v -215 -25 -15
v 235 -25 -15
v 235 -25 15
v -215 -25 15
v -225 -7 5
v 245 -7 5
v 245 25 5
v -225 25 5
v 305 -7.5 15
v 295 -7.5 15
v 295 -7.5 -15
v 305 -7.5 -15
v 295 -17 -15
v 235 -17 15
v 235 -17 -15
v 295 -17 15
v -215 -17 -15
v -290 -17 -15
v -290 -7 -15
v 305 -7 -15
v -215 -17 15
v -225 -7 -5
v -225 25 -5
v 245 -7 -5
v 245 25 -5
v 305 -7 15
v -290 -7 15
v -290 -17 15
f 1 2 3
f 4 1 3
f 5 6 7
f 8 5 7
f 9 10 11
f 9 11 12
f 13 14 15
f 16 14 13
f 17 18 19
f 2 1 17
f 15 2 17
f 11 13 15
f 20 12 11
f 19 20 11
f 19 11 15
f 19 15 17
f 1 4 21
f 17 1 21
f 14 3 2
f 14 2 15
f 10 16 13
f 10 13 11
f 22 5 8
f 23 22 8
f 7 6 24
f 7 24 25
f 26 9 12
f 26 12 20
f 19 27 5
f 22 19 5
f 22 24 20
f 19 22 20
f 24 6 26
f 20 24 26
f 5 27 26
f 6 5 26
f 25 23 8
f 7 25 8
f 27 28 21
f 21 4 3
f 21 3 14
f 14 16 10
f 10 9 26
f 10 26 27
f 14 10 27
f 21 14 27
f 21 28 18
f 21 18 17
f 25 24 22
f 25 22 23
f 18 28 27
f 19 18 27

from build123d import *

# Parameters (mm, degrees)
SKETCH033_W     = 50
SKETCH033_H     = 30
PAD003_DEPTH    = 610
SKETCH034_W     = 70
SKETCH034_H     = 8
SKETCH034_W_2   = 60
SKETCH034_H_2   = 32
POCKET029_DEPTH = 30.001
SKETCH036_W     = 80
SKETCH036_H     = 32
SKETCH036_W_2   = 90
SKETCH036_H_2   = 8
POCKET031_DEPTH = 30.001
SKETCH037_W     = 32
SKETCH037_H     = 10
POCKET032_DEPTH = 1835.562096
SKETCH038_W     = 15
SKETCH038_H     = 50
POCKET033_DEPTH = 30.001
SKETCH039_W     = 10
SKETCH039_H     = 32.5
POCKET034_DEPTH = 30.001


with BuildPart() as part:
    # Sketch033 (on DatumPlane) → Pad003 (new body)
    with BuildSketch(Plane.YZ.offset(305)):
        Rectangle(SKETCH033_W, SKETCH033_H)
    extrude(amount=-PAD003_DEPTH)

    # Sketch034 (on DatumPlane) → Pocket029 (cut, through all)
    with BuildSketch(Plane.XY.offset(15)):
        with Locations((270, -21)):
            Rectangle(SKETCH034_W, SKETCH034_H)
        with Locations((275, 9)):
            Rectangle(SKETCH034_W_2, SKETCH034_H_2)
    extrude(amount=-POCKET029_DEPTH, mode=Mode.SUBTRACT)

    # Sketch036 (on DatumPlane) → Pocket031 (cut, through all)
    with BuildSketch(Plane.XY.offset(15)):
        with Locations((-265, 9)):
            Rectangle(SKETCH036_W, SKETCH036_H)
        with Locations((-260, -21)):
            Rectangle(SKETCH036_W_2, SKETCH036_H_2)
    extrude(amount=-POCKET031_DEPTH, mode=Mode.SUBTRACT)

    # Sketch037 (on DatumPlane) → Pocket032 (cut, through all)
    with BuildSketch(Plane.YZ.offset(305)):
        with Locations((9, 10)):
            Rectangle(SKETCH037_W, SKETCH037_H)
    pocket032 = extrude(amount=-POCKET032_DEPTH, mode=Mode.SUBTRACT)

    # Mirrored004: Pocket032 across Sketch037 H_Axis
    add(pocket032.mirror(Plane(origin=(305, 0, 0), x_dir=(1, 0, 0), z_dir=(0, 0, 1))), mode=Mode.SUBTRACT)

    # Sketch038 (on DatumPlane) → Pocket033 (cut, through all)
    with BuildSketch(Plane.XY.offset(15)):
        with Locations((-297.5, 0)):
            Rectangle(SKETCH038_W, SKETCH038_H)
    extrude(amount=-POCKET033_DEPTH, mode=Mode.SUBTRACT)

    # Sketch039 (on DatumPlane) → Pocket034 (cut, through all)
    with BuildSketch(Plane.XY.offset(15)):
        with Locations((300, -23.75)):
            Rectangle(SKETCH039_W, SKETCH039_H)
    extrude(amount=-POCKET034_DEPTH, mode=Mode.SUBTRACT)


solid = part.part
